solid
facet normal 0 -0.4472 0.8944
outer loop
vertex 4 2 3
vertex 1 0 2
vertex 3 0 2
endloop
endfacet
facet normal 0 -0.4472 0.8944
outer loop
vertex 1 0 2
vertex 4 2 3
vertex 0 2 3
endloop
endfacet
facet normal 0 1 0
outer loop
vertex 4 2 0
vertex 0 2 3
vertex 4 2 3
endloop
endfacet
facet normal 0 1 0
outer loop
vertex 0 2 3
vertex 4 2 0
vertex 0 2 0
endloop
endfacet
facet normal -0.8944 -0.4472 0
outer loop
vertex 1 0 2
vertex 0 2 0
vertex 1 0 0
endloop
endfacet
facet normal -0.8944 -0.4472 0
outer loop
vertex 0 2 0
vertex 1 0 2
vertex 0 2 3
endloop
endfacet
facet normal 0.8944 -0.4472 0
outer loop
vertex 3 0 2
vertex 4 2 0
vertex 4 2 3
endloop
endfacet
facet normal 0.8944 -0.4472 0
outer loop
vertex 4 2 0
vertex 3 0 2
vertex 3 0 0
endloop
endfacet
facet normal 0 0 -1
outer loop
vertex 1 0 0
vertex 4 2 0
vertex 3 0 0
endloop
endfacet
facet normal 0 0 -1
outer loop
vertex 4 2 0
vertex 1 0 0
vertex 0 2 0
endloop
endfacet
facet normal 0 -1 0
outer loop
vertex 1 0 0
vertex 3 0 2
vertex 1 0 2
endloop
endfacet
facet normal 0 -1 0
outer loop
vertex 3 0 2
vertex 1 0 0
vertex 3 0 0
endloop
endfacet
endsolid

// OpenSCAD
center = 2;

spread = 1;
rise = 1;
hieght = center + rise;
width = center + (2 * spread);
depth = center;
 
module triangle(x, y) {
    polygon ([[0,0], [x,0],[0,y]]);
}


translate([spread,0,0])  cube([center,depth,center]);

module lhs() {    
    translate([spread,depth,0]) 
        rotate([0,0,180]) 
            linear_extrude(hieght) 
                triangle(spread , depth);
}

module rhs() {
    translate([width-spread,depth,0]) 
    mirror ([0,1,0])
            linear_extrude(hieght) 
                triangle(spread, depth);
}

module top() {
    translate([width,depth,hieght - rise])
        rotate([-90,180,90])
            linear_extrude(width)
                triangle(depth, rise);
}

module leftPanel() {
    translate([spread,depth,0]) 
        rotate([0,0,180]) 
            linear_extrude(hieght - rise) 
                triangle(spread, depth);
}

module rightPanel() {
    translate([width-spread,depth,0]) 
    mirror ([0,1,0])
            linear_extrude(hieght - rise) 
                triangle(spread, depth);
}

module topPanel() {
    translate([width - spread,depth,hieght - rise])
        rotate([-90,180,90])
            linear_extrude(width - spread * 2)
                triangle(depth, rise);
}


union() {
    intersection() {
        top();
        lhs();
    }

    intersection() {
        top();
        rhs();
    }

    leftPanel();
    rightPanel();
    topPanel();
}

   //faces=[ [0,1,4],[1,2,4],[2,3,4],[3,0,4],[1,0,3],[2,1,3] ]  
